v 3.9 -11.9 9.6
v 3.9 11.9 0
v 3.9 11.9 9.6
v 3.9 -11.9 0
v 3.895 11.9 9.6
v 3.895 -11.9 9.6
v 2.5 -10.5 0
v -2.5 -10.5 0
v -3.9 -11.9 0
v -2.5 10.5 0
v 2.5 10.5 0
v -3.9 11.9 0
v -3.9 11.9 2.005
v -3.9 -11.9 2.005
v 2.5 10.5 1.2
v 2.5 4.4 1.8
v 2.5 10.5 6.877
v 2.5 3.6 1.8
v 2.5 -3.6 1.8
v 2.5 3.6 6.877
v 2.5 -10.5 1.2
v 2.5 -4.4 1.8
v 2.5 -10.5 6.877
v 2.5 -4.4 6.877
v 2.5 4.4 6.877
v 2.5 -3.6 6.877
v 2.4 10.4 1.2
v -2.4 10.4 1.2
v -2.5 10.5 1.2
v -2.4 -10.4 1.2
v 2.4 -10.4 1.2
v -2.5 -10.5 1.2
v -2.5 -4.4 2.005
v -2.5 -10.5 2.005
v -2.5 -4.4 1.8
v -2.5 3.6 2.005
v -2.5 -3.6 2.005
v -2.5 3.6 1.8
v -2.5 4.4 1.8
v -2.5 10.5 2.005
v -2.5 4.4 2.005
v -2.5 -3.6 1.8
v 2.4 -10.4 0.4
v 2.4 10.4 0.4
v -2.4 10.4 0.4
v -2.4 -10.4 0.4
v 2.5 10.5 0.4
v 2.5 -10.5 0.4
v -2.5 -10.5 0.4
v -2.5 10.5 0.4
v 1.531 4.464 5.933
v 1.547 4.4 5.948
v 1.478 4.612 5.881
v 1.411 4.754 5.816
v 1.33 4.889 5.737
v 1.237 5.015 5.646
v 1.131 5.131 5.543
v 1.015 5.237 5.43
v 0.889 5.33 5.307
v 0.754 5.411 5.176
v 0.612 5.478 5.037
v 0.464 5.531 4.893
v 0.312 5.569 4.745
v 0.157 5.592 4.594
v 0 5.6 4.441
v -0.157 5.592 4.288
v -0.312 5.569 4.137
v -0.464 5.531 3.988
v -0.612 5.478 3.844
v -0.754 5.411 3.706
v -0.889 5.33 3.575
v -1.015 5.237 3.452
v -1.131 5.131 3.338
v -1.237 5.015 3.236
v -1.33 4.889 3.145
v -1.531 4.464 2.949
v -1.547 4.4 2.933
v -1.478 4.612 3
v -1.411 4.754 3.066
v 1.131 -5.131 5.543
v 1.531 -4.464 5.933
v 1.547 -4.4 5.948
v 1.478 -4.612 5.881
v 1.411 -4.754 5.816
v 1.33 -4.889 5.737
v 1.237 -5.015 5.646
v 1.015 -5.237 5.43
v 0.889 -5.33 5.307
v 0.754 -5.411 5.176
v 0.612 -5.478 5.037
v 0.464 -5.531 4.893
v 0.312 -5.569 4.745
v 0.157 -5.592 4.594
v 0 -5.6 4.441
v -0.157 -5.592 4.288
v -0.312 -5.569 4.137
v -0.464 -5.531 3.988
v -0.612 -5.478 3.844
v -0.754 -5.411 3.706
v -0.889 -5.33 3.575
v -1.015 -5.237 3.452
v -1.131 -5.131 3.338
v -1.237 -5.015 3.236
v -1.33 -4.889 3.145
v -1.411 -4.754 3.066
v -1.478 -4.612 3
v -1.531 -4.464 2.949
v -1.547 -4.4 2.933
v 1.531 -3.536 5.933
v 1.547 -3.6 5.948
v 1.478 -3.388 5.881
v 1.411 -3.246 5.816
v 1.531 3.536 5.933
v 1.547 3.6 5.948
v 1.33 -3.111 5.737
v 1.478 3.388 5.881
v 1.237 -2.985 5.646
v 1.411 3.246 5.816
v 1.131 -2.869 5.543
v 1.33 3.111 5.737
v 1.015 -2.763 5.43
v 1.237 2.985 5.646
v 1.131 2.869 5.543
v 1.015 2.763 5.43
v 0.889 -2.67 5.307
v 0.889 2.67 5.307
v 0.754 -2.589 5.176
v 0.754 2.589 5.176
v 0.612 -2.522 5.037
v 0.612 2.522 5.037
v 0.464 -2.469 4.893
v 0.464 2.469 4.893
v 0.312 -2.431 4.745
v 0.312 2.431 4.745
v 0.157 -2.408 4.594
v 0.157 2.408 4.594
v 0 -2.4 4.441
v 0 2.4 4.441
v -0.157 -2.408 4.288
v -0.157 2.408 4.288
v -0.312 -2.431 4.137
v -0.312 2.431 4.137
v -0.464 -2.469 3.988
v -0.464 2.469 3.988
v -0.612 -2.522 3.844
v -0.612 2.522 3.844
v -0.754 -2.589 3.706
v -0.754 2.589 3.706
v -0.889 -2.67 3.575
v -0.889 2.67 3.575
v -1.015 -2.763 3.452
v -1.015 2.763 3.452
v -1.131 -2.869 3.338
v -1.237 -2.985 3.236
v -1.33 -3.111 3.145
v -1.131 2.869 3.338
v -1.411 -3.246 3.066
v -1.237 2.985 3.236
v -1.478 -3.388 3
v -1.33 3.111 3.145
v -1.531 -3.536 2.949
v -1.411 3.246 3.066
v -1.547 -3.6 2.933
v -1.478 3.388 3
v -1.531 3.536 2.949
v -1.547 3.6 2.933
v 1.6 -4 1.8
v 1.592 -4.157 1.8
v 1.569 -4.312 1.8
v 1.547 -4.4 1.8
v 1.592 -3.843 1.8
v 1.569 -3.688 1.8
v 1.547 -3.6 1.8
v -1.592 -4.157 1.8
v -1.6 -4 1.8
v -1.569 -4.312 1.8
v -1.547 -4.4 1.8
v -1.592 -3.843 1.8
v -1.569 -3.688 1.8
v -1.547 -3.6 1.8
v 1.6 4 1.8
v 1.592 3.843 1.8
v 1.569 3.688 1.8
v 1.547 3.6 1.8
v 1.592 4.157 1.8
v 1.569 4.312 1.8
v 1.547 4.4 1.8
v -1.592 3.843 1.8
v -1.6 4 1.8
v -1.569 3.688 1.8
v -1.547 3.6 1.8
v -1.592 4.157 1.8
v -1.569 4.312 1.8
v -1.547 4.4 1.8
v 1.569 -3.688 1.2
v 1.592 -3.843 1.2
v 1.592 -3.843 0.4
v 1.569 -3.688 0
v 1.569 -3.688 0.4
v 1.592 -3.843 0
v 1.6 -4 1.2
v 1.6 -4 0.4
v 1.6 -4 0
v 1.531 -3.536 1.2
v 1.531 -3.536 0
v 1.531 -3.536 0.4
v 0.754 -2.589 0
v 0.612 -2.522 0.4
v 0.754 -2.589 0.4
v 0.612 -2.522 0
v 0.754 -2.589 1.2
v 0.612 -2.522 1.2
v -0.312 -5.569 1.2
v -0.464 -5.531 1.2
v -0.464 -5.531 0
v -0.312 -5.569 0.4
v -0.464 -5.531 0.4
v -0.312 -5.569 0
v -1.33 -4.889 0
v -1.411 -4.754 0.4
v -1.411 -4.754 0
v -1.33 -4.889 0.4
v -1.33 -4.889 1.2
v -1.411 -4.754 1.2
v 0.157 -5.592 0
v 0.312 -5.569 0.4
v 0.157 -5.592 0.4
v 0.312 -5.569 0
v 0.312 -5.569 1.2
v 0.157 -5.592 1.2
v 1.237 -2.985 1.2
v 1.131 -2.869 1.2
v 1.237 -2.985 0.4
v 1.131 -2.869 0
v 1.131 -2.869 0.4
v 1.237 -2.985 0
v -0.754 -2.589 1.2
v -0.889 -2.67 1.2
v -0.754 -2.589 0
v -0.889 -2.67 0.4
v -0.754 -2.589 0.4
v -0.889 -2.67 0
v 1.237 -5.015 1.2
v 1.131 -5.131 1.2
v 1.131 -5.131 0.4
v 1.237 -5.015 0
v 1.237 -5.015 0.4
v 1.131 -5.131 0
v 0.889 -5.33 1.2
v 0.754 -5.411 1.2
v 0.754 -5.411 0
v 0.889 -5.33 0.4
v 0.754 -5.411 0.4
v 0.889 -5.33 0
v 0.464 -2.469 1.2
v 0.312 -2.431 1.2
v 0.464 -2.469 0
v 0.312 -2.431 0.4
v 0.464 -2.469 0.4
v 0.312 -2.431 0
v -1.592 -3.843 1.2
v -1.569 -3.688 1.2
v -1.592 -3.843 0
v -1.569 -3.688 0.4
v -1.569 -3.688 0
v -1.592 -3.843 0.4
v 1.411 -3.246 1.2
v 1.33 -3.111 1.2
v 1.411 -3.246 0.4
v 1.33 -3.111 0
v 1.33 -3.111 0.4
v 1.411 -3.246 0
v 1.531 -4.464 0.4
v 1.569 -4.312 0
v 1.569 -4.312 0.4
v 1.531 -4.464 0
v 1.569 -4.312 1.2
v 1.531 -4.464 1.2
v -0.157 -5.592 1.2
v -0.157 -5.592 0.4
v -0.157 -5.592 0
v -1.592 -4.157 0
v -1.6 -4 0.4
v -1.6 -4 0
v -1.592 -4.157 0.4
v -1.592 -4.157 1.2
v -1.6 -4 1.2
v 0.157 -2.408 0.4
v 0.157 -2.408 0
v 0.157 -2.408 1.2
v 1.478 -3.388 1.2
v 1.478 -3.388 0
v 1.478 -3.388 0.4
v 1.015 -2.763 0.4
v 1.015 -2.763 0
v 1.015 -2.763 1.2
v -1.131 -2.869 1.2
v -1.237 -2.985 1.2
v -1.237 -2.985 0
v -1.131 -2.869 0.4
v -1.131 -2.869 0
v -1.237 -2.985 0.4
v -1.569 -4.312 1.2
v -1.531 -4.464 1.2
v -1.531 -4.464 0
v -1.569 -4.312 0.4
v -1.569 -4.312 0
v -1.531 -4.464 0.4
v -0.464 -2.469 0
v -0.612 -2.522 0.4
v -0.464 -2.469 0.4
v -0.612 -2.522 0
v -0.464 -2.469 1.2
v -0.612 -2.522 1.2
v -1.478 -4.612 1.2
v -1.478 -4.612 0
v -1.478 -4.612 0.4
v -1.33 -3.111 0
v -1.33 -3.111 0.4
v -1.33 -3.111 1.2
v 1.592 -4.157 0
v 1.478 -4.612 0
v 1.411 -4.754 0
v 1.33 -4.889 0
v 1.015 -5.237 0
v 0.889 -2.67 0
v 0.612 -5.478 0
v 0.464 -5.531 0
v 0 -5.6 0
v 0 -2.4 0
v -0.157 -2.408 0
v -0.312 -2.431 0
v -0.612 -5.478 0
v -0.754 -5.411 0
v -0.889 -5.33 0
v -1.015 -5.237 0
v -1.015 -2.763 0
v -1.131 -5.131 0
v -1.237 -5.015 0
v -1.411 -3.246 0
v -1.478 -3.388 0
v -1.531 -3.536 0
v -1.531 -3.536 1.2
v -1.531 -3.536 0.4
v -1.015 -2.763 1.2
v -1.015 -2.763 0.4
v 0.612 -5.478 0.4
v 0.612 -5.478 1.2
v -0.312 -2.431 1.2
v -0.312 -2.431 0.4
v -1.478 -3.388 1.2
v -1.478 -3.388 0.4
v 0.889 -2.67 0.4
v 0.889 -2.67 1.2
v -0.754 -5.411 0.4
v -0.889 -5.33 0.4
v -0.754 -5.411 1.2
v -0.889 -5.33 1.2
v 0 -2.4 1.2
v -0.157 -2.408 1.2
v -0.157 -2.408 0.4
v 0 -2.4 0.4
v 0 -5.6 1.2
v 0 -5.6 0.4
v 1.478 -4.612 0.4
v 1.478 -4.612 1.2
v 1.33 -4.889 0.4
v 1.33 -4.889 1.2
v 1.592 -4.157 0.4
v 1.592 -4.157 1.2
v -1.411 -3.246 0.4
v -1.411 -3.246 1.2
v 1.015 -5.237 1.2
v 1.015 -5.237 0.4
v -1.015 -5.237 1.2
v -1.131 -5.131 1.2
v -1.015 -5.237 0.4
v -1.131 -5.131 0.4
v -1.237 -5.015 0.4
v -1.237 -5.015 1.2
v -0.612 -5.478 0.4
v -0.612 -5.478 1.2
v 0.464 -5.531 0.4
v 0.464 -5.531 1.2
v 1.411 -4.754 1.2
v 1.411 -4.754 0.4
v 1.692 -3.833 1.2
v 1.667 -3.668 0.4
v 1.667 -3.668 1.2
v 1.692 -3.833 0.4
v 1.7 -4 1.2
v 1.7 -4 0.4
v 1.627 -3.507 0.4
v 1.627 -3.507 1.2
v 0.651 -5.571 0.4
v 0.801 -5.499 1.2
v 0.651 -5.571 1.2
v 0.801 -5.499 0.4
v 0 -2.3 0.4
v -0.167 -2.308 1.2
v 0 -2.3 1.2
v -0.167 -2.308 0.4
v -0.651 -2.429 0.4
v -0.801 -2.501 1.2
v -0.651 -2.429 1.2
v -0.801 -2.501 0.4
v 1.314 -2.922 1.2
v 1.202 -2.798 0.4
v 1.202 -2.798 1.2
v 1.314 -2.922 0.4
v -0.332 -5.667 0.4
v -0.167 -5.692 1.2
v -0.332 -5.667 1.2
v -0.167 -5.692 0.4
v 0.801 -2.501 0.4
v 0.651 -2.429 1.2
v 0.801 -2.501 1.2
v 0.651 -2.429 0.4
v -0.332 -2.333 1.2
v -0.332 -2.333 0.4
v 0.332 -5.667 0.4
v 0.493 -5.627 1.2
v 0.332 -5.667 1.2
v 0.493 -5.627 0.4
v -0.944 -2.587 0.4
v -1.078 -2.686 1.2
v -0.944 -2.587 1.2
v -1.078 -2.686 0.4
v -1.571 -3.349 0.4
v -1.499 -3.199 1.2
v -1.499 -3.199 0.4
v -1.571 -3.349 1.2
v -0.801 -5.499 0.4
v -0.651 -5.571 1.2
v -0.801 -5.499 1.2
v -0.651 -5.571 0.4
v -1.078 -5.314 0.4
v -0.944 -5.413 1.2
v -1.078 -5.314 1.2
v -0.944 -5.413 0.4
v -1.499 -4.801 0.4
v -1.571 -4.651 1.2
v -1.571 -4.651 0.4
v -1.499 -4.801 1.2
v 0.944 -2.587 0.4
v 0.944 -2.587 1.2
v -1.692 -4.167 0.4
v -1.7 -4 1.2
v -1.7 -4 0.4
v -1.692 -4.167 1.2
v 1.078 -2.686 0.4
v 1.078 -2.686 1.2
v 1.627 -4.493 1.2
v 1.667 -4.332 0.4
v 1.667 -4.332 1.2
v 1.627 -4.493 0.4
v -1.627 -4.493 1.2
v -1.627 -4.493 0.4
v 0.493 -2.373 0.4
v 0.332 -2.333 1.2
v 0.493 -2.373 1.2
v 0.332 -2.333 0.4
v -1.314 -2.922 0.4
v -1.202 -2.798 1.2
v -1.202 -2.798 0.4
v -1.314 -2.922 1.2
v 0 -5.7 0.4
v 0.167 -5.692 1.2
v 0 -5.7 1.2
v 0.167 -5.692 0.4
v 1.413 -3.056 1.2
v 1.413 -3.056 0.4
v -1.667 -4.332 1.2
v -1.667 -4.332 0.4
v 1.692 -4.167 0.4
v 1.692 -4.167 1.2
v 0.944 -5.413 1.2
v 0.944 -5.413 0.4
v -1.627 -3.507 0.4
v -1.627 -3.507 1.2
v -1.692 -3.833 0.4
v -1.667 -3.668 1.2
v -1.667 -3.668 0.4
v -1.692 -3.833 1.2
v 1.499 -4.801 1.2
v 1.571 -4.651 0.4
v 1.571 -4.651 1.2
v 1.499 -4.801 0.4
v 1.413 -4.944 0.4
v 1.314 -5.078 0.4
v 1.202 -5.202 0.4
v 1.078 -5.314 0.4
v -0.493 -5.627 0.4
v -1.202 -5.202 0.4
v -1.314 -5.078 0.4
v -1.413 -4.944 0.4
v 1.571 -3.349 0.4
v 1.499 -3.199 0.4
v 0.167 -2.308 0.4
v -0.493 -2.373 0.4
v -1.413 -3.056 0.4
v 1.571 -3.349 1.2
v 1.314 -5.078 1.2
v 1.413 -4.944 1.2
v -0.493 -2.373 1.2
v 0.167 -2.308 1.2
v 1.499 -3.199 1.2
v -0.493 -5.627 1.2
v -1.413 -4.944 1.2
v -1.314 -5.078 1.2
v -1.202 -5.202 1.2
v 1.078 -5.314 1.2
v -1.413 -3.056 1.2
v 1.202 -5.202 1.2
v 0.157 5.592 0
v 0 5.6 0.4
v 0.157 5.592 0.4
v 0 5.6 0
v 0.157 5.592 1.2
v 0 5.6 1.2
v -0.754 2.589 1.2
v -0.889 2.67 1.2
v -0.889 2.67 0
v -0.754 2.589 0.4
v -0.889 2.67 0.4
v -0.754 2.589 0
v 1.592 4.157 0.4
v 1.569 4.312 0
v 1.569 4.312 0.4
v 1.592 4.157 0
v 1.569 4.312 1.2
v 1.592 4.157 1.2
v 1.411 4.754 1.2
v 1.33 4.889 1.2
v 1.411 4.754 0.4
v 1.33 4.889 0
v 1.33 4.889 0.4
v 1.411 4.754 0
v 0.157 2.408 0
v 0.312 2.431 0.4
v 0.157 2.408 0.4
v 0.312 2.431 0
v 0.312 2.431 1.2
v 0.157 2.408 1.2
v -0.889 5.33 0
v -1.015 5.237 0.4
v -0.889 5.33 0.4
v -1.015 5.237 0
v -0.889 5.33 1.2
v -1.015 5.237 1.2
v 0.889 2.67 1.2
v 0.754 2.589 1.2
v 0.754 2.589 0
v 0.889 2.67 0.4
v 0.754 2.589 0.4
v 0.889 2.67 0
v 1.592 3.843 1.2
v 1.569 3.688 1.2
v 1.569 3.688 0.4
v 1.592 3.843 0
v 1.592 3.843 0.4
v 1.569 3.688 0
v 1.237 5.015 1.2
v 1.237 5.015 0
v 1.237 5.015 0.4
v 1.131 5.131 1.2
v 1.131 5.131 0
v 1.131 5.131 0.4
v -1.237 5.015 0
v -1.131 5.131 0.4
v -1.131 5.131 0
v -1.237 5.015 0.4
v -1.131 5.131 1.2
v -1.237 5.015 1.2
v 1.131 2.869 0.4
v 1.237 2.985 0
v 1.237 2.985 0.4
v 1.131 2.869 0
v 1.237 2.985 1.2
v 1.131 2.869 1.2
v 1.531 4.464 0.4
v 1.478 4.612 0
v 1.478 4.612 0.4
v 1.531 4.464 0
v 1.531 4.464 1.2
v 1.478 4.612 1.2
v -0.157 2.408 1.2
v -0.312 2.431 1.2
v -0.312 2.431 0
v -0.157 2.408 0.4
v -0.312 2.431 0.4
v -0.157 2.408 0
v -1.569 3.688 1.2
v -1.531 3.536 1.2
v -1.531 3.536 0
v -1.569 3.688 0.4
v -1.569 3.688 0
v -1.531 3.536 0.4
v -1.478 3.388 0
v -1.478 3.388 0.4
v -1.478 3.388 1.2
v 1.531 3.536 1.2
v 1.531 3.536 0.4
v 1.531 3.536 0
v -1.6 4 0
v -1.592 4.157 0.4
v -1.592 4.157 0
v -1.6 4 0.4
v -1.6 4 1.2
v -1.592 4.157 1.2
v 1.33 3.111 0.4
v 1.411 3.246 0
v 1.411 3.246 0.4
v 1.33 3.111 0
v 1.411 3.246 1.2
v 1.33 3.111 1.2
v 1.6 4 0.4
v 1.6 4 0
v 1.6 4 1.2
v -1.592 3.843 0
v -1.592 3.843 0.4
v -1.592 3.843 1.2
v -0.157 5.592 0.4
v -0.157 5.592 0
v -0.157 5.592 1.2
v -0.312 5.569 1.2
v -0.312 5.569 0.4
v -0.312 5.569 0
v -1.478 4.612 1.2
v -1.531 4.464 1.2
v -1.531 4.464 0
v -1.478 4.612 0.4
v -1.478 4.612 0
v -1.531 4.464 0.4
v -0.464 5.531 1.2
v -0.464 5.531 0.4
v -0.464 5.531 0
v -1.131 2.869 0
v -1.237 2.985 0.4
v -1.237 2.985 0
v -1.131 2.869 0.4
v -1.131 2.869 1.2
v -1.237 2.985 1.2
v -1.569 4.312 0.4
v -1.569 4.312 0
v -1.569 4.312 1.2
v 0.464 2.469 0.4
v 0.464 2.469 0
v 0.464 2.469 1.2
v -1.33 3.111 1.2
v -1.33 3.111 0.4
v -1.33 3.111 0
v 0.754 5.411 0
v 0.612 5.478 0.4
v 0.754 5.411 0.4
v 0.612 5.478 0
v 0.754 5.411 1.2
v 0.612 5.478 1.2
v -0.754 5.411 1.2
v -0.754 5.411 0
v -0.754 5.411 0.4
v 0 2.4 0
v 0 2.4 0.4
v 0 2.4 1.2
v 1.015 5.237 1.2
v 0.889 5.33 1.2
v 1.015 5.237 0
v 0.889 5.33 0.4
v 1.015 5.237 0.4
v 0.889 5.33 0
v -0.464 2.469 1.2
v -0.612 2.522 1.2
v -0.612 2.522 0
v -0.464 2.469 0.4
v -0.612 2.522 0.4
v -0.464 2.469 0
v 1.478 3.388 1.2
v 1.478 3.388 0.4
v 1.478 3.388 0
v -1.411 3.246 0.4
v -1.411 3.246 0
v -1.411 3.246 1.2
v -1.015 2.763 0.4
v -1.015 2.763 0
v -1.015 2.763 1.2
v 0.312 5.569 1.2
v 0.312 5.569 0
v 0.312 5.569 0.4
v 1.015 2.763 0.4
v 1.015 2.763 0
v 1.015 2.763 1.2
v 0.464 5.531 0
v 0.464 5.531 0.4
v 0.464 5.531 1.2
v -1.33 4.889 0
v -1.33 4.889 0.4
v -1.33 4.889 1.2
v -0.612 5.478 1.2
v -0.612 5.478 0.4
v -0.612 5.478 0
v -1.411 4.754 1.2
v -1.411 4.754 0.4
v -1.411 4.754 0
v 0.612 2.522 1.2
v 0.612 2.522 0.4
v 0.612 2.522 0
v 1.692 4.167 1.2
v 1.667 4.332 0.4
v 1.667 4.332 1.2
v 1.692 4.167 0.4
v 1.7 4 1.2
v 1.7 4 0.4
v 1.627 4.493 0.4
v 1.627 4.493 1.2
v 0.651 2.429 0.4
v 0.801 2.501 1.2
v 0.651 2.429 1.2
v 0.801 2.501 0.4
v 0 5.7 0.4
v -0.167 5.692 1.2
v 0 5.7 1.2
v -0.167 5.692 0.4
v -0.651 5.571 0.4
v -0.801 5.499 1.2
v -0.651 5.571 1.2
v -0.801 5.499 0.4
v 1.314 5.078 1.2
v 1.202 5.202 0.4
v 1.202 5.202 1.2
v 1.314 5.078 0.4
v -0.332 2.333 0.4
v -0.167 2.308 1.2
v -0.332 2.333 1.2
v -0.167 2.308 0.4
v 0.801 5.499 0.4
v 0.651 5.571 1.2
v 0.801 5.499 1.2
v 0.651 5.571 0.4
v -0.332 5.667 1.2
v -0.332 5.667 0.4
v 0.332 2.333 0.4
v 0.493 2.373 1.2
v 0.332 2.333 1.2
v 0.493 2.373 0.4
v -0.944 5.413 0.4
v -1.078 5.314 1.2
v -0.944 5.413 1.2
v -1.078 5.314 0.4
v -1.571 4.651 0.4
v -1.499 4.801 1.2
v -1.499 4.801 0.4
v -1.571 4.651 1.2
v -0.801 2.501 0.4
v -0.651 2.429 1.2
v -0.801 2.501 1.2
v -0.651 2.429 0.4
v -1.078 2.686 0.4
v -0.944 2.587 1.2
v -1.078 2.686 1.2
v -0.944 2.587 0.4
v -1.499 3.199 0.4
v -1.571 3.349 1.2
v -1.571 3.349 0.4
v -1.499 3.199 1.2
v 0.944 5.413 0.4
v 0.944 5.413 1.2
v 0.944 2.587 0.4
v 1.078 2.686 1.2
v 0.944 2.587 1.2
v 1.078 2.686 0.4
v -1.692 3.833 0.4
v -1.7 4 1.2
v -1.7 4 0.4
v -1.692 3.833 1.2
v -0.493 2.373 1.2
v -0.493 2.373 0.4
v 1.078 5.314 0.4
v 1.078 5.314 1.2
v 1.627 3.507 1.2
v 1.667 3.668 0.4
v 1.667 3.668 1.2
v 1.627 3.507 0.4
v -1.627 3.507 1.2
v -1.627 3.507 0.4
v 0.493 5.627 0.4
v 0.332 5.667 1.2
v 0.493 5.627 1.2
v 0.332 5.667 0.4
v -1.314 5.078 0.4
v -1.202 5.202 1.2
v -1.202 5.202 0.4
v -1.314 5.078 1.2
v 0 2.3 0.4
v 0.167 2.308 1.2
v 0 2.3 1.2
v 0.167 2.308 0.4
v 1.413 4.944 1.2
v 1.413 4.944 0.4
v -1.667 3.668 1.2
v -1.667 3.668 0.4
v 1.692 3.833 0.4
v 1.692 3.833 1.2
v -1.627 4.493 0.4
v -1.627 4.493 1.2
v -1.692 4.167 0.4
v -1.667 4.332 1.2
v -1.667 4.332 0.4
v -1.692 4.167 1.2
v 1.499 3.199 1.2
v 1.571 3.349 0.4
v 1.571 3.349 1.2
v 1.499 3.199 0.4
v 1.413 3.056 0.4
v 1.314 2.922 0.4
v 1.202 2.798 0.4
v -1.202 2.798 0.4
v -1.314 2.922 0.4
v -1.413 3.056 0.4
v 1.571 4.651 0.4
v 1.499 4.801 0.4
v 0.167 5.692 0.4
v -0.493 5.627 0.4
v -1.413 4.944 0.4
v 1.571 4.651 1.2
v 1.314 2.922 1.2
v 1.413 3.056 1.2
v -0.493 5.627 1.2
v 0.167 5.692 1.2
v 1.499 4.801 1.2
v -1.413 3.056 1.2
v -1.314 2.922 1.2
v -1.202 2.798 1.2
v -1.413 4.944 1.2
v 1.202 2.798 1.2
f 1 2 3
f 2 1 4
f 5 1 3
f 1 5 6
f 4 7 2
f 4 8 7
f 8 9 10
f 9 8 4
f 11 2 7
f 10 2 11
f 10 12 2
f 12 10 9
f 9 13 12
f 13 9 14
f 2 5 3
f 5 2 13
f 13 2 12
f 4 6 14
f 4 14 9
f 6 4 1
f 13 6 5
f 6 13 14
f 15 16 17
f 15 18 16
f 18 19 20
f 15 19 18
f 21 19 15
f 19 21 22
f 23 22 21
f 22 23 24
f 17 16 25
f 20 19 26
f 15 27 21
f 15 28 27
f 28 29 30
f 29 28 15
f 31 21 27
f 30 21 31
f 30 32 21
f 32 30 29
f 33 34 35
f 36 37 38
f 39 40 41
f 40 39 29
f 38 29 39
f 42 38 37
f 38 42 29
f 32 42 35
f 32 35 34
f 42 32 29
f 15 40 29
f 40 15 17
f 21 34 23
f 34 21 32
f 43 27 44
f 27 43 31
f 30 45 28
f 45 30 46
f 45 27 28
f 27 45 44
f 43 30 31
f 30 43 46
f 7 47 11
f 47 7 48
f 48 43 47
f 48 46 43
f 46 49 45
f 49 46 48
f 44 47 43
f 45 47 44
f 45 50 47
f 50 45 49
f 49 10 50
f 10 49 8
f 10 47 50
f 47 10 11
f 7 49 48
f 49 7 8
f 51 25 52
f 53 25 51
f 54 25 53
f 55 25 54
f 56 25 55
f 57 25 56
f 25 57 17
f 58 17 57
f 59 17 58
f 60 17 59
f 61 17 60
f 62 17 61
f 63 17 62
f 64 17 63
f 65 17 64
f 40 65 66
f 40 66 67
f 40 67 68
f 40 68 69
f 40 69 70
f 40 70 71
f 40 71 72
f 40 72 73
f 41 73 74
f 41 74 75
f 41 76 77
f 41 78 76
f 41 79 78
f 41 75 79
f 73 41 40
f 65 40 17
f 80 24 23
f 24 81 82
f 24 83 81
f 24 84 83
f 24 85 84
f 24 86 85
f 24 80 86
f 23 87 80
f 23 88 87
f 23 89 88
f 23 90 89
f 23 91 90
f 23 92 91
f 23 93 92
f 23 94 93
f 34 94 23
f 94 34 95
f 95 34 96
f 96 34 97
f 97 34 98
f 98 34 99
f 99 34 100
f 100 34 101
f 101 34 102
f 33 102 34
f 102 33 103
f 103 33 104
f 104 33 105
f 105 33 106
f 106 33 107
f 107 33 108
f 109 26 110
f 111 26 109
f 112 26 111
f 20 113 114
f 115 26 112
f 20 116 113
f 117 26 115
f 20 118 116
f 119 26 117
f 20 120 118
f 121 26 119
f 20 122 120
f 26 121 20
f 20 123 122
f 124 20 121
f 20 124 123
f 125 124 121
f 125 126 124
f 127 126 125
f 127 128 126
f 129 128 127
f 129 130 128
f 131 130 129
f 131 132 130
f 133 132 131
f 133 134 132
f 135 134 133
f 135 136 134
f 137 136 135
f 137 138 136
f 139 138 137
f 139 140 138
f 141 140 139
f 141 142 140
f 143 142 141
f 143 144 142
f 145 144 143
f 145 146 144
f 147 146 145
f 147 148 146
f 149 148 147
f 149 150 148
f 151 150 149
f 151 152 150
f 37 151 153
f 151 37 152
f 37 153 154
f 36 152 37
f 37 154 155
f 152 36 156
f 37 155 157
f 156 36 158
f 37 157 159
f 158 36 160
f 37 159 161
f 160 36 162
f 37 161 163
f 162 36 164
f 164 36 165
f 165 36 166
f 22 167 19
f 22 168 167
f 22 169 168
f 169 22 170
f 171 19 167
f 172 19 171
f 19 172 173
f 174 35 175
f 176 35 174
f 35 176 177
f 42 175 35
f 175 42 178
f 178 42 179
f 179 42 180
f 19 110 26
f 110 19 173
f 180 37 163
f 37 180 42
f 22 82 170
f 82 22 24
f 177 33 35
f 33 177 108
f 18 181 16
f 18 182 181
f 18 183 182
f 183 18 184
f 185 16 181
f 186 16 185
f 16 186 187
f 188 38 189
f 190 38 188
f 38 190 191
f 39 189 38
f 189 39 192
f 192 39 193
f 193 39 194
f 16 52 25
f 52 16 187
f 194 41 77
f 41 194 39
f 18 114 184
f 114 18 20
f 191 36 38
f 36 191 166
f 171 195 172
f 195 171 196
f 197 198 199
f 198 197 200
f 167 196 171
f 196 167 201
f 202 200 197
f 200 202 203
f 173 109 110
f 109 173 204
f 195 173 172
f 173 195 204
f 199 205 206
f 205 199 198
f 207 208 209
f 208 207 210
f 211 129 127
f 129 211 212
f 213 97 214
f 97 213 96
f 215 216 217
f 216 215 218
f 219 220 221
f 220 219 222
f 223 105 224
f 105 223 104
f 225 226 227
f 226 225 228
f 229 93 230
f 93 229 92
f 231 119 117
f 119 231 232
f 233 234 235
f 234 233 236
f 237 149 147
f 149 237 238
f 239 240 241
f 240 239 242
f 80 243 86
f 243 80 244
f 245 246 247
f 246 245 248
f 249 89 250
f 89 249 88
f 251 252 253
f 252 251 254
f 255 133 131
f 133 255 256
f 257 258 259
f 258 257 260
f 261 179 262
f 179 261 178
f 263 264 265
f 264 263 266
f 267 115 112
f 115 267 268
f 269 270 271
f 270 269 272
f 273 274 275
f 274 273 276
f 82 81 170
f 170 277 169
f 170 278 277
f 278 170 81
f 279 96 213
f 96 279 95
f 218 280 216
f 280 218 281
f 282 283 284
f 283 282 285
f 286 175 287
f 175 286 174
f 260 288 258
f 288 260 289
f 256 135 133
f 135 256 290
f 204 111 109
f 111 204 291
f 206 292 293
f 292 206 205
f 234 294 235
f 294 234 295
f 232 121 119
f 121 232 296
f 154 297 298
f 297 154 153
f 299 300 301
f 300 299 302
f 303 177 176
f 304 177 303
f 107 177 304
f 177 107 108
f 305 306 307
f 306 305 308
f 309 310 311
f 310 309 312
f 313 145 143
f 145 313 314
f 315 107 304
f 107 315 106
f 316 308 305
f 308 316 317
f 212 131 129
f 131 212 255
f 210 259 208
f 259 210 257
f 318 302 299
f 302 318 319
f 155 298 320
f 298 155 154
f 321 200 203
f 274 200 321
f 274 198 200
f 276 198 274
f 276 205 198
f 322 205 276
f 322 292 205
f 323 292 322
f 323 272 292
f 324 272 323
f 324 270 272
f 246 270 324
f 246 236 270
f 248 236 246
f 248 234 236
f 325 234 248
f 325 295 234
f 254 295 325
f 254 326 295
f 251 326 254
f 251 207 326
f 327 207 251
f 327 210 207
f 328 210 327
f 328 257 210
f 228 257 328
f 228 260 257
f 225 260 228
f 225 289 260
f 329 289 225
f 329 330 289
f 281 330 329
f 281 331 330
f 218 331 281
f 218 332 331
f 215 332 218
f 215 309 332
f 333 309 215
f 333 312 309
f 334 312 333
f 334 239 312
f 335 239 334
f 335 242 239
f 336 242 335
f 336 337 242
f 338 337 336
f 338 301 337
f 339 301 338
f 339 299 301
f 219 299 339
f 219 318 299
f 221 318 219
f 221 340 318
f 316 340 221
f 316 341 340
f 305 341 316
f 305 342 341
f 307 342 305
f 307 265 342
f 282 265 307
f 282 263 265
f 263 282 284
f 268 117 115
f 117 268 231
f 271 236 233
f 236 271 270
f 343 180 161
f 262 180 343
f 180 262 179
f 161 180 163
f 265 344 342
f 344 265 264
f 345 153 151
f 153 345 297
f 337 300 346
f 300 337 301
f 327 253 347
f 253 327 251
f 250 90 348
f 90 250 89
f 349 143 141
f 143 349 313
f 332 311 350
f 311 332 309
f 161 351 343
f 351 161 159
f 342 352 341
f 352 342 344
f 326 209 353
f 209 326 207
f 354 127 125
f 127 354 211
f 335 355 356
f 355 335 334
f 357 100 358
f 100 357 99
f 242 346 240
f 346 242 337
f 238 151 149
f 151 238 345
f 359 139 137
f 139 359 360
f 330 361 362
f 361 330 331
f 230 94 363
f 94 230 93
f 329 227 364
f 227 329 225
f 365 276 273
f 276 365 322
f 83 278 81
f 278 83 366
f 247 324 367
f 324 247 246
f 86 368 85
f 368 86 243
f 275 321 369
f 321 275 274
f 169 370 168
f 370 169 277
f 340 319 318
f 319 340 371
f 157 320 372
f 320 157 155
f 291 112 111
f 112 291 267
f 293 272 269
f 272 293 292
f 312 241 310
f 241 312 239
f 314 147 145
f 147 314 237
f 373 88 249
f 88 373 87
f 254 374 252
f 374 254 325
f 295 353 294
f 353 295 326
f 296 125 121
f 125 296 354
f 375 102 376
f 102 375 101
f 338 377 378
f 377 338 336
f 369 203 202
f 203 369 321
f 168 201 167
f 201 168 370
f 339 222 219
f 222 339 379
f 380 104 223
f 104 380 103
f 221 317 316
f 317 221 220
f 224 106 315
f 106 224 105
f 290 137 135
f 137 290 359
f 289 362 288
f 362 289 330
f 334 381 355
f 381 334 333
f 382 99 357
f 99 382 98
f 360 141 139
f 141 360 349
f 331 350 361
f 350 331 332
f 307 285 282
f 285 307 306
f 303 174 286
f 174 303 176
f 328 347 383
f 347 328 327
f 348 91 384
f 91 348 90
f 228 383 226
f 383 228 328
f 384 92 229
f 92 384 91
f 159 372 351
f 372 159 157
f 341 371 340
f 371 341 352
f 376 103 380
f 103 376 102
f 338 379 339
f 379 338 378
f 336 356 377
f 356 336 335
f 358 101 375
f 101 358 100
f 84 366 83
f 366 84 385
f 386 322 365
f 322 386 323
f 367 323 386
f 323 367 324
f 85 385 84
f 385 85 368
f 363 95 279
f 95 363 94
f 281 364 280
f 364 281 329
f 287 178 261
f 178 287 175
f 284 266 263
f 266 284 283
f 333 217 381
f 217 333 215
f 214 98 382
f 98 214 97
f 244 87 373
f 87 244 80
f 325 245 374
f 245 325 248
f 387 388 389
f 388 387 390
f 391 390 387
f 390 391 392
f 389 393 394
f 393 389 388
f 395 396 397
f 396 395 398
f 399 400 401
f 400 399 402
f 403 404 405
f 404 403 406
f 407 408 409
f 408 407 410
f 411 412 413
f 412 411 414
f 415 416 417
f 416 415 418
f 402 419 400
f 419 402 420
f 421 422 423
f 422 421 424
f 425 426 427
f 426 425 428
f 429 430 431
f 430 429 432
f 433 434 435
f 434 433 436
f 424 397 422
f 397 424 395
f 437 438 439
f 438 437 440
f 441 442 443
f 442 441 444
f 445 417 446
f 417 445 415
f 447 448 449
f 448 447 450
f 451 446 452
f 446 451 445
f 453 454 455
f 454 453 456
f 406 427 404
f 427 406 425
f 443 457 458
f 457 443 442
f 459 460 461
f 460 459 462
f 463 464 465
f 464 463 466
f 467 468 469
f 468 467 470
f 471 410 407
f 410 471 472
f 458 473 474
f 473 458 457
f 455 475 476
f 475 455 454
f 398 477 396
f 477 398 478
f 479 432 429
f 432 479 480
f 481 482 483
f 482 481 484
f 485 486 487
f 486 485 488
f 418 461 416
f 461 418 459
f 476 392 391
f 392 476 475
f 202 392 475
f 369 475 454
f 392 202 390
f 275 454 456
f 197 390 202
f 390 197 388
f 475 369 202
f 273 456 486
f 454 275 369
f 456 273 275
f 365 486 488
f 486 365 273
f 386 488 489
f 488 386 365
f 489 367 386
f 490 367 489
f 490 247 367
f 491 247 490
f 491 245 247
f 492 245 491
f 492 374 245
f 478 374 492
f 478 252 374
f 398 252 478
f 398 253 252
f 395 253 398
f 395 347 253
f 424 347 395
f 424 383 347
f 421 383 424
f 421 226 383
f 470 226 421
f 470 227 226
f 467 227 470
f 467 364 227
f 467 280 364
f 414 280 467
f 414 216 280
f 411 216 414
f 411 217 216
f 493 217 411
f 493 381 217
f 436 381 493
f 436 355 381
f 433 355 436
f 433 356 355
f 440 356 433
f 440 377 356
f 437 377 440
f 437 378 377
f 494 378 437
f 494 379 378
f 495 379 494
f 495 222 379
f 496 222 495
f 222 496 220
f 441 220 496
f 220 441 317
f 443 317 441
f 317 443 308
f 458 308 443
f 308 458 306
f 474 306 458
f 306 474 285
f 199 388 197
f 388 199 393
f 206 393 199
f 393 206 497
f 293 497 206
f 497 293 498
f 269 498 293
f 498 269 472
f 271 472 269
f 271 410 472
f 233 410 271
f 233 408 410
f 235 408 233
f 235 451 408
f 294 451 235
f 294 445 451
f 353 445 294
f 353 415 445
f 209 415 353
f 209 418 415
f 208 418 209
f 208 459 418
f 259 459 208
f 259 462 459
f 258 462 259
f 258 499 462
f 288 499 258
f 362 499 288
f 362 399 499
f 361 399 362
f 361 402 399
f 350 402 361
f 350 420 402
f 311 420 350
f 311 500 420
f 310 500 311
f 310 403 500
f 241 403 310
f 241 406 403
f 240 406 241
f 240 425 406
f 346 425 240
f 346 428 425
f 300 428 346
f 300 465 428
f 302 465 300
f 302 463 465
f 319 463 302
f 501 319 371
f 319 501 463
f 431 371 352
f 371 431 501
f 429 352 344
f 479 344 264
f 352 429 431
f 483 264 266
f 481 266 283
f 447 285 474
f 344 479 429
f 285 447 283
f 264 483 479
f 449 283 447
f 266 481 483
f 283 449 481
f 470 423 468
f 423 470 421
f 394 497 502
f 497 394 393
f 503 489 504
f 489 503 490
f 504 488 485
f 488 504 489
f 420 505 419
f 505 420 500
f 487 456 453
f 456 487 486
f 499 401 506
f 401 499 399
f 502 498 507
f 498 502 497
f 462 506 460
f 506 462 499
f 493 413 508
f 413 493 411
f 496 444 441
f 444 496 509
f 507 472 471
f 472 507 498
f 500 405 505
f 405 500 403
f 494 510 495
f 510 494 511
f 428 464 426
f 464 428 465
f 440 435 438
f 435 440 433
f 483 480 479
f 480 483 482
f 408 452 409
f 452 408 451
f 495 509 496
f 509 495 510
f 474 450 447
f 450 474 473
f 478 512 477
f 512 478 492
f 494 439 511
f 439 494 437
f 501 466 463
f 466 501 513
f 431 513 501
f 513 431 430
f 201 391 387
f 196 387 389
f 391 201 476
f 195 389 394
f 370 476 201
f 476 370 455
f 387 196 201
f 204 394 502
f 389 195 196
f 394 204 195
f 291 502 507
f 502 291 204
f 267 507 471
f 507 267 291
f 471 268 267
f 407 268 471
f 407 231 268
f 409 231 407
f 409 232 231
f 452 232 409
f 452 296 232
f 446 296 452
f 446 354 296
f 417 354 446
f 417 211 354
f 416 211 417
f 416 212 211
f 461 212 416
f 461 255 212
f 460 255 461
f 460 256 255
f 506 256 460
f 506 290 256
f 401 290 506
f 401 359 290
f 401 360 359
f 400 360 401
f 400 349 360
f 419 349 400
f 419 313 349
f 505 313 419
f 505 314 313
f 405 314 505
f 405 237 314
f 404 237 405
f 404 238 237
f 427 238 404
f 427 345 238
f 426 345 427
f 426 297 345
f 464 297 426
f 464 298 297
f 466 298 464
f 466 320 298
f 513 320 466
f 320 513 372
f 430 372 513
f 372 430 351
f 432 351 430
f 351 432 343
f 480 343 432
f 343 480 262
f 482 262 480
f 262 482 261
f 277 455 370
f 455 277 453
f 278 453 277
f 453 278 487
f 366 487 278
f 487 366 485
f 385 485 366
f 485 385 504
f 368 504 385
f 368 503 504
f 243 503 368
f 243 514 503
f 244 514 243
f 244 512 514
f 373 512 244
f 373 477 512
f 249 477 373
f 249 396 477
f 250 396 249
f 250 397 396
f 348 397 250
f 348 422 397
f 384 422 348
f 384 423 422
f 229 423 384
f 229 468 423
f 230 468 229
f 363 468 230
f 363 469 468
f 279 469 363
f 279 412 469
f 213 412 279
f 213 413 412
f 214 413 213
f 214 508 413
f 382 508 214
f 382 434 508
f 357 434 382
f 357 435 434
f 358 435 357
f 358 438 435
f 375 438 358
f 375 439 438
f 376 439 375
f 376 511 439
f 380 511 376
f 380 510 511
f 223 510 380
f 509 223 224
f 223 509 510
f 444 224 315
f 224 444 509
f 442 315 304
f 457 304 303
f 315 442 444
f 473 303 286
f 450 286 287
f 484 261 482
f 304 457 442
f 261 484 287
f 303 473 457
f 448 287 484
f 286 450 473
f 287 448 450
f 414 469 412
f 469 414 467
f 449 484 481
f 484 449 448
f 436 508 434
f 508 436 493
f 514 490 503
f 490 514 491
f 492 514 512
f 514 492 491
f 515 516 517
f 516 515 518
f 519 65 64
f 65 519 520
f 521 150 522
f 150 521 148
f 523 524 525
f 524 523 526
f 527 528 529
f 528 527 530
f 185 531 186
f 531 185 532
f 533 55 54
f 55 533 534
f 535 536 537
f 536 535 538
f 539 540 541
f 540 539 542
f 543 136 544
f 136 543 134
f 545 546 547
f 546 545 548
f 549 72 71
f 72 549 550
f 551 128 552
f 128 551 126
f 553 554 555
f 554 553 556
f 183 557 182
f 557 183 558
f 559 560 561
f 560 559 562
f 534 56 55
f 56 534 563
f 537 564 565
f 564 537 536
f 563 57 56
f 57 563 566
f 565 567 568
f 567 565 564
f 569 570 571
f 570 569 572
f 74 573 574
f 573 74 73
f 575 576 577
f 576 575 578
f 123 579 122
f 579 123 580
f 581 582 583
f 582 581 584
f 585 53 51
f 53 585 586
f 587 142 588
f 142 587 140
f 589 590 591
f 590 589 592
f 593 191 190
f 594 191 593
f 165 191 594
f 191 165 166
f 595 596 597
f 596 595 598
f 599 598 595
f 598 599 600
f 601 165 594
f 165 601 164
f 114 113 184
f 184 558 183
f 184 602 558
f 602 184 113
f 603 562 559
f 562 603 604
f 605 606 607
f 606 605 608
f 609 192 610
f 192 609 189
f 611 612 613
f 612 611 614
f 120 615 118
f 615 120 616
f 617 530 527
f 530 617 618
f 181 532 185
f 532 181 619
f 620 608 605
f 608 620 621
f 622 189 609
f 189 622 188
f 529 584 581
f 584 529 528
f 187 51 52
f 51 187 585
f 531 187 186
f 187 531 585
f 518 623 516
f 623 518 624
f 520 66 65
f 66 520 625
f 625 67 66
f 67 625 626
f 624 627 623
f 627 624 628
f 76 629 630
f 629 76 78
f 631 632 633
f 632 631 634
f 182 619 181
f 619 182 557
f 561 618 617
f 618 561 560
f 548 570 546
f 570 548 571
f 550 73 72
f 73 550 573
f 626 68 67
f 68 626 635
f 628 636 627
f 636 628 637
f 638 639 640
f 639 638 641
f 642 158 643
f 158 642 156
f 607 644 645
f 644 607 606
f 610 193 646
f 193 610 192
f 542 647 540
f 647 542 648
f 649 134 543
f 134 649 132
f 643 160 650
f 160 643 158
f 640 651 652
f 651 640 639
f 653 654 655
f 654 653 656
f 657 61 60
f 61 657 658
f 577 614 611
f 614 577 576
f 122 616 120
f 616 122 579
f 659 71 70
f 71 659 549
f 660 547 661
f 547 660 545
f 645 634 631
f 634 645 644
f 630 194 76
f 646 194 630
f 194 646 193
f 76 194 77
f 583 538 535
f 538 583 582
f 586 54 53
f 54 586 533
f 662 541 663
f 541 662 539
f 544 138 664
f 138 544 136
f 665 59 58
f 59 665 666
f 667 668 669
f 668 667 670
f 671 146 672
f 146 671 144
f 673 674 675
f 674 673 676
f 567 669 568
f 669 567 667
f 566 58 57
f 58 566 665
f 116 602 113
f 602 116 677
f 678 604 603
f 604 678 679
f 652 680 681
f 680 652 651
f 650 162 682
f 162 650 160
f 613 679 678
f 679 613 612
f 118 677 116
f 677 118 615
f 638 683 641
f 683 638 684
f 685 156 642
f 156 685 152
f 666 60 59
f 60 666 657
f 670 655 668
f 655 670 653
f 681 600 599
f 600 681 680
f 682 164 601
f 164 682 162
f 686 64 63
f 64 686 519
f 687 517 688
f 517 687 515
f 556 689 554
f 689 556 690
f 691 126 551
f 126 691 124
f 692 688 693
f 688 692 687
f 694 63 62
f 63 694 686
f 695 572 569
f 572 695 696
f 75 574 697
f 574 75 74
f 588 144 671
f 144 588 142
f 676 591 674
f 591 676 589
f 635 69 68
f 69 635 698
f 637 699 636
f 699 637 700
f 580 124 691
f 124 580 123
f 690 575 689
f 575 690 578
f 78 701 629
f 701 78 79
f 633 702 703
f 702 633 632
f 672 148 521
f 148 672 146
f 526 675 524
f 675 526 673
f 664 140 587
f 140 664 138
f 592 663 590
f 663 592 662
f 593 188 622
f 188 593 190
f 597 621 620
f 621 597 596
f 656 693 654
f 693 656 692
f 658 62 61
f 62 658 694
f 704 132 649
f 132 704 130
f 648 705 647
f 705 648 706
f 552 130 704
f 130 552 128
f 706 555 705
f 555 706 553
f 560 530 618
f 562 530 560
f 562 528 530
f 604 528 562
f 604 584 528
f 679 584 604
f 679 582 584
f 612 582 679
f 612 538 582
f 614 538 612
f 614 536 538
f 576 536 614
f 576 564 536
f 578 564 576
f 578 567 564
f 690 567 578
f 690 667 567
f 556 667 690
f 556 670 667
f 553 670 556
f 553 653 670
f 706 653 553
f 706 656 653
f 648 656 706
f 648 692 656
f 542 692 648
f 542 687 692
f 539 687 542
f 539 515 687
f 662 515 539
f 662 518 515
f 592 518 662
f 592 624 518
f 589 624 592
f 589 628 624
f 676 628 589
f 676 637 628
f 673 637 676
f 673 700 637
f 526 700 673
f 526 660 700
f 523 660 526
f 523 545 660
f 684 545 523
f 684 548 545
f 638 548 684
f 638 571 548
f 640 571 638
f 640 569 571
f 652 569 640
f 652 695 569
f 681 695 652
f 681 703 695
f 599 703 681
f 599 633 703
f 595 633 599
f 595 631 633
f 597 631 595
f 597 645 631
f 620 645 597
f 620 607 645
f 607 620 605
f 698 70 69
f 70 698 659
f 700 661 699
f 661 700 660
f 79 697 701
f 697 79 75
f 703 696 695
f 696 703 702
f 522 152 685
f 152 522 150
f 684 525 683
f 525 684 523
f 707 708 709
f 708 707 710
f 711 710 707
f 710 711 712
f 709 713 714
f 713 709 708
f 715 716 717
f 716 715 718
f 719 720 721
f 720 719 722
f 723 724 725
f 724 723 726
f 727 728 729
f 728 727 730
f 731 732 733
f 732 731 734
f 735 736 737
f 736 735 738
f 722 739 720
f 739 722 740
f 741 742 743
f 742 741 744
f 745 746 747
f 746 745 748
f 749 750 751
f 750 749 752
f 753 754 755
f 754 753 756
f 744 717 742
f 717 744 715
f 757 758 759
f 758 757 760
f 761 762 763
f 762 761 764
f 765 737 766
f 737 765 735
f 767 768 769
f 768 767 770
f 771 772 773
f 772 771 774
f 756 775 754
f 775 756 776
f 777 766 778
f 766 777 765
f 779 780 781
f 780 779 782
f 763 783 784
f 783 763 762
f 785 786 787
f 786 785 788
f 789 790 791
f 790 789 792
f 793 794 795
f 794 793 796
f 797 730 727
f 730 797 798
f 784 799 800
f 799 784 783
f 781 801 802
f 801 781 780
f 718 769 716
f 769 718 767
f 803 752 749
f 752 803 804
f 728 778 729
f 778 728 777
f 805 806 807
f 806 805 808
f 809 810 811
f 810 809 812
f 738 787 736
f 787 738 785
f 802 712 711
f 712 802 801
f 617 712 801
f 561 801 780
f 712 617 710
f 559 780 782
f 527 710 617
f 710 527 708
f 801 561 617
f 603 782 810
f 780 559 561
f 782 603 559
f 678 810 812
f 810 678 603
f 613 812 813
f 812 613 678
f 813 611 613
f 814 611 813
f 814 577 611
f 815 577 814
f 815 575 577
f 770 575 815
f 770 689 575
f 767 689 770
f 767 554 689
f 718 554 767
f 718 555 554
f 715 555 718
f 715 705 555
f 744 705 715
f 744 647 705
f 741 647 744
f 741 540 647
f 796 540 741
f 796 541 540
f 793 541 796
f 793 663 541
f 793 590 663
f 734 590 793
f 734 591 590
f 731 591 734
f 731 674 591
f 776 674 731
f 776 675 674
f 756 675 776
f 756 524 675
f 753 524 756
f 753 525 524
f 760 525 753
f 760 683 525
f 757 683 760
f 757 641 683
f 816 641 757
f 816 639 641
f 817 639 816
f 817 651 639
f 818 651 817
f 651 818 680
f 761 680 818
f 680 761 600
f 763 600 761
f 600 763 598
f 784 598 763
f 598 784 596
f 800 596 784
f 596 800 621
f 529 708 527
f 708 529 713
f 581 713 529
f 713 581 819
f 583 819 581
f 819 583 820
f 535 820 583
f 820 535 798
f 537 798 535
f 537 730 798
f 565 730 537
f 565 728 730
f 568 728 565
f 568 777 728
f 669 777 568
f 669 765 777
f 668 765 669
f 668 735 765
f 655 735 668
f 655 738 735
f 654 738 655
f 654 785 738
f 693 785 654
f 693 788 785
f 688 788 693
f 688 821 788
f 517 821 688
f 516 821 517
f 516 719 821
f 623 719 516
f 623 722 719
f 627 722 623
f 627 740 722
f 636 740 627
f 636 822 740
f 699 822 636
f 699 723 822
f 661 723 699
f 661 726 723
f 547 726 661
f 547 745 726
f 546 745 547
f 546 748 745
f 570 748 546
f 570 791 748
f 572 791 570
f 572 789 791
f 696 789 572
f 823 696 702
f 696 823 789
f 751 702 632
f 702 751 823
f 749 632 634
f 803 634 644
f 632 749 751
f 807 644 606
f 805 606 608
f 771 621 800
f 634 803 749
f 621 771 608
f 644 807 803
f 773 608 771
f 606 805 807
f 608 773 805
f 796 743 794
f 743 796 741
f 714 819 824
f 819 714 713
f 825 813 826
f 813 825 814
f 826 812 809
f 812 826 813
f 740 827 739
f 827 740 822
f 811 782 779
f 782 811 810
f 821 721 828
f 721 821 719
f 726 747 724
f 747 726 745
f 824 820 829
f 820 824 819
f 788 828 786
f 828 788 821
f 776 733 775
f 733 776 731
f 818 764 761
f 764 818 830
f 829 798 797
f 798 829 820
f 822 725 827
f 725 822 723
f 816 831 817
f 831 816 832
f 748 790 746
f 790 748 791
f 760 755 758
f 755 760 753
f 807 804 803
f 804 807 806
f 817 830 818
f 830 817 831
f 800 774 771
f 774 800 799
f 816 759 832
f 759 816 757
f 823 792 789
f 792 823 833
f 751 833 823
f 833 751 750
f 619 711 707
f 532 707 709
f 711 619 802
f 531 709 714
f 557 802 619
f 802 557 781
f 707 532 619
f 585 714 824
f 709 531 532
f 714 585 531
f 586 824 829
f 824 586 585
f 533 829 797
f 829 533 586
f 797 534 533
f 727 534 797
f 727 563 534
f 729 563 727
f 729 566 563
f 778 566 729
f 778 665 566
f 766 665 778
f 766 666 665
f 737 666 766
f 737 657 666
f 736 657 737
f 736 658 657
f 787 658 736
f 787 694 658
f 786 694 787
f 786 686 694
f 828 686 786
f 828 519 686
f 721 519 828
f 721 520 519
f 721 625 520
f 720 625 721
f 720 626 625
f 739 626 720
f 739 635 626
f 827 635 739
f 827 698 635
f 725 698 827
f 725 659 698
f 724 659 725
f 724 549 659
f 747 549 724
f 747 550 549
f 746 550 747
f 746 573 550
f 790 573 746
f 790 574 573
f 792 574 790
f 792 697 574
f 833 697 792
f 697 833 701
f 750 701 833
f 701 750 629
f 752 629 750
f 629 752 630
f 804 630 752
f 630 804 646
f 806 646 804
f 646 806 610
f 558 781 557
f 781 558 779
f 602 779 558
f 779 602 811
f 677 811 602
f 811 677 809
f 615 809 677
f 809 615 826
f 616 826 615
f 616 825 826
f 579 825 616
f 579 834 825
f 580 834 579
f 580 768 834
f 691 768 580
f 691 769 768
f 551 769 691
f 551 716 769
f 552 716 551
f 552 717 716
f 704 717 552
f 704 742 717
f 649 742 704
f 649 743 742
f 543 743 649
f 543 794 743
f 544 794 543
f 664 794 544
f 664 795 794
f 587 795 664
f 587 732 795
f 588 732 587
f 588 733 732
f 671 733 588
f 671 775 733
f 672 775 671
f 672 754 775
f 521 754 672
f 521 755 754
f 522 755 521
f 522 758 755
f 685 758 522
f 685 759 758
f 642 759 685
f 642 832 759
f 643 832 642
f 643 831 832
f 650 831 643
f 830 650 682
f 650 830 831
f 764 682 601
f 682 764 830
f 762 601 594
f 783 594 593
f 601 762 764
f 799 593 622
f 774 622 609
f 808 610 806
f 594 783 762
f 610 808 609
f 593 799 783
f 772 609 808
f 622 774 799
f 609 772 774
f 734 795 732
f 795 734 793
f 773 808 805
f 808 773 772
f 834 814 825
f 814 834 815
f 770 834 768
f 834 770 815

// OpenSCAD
// file: ../../lib/connectors.scad
module
mb_connector_prism(side, height, size)
{
  zRots = [ 315, 135, 45, 225 ];
  rotate([ 90, 90, zRots[side] ])
    translate([ -0.5 * height, -0.5 * size, -0.5 * size ])
      polyhedron(points =
                   [
                     [ 0, 0, 0 ],
                     [ height, 0, 0 ],
                     [ height, size, 0 ],
                     [ 0, size, 0 ],
                     [ 0, size, size ],
                     [ height, size, size ]
                   ],
                 faces = [
                   [ 0, 1, 2, 3 ],
                   [ 5, 4, 3, 2 ],
                   [ 0, 4, 5, 1 ],
                   [ 0, 3, 4 ],
                   [ 5, 2, 1 ]
                 ]);
}

module
mb_connectors(side, grid, baseHeight, height, size, depth, gs, inverse)
{
  sigs = [ -1, 1, -1, 1 ];
  gX = [ 0, 0, 1, 1 ];
  gY = [ 1, 1, 0, 0 ];

rotate(inverse ? [0,0,180]:[0,0,0])
  for (i = [0:1:grid[gY[side]] - 1]) {
    t0X = (0.5 * grid[gX[side]] * gs + (inverse ? -1 : 1) * depth);
    t0Y = (i + 0.5 - 0.5 * grid[gY[side]]) * gs;

    color([ 0.945, 0.769, 0.059 ]) // f1c40f
      translate([

        side < 2 ? (inverse ? -1 : 1) * sigs[side] * t0X : t0Y,
        side < 2 ? t0Y : (inverse ? -1 : 1) * sigs[side] * t0X,
        -0.5 * baseHeight + 0.5 *
        (height + (inverse ? -0.02 : 0))
      ]) mb_connector_prism(side, height+ (inverse ? 0.02 : 0), size);
  }
}

module
mb_connector_grooves(side,
                     grid,
                     baseHeight,
                     height,
                     tolerance,
                     size,
                     depth,
                     gs,
                     inverse)
{
  gX = [ 0, 0, 1, 1 ];
  gY = [ 1, 1, 0, 0 ];
  rot = [ 90, 90, 0, 0 ];
  
  sigs = [ 1, -1, -1, 1 ];
  rotate([ 90, inverse ? 180 : 0, rot[side] ]) for (i =
                                                      [0:1:grid[gY[side]] - 1])
  {
    translate([
      (-(0.5 * grid[gY[side]] - 0.5) * gs + i * gs),
      -0.5 * baseHeight + height,
      sigs[side] * (-0.5 * grid[gX[side]] * gs + 0.5 * depth - 0.02)
    ]) mb_connector_prism(3, depth + 0.02, size);
  }
}
// file: ../../lib/pcb.scad
module prism(l, w, h) {
    translate([-0.5*l,0, -0.5*h])
    rotate([0,0,-90])
       polyhedron(points=[
               [0,0,h],           // 0    front top corner
               [0,0,0],[w,0,0],   // 1, 2 front left & right bottom corners
               [0,l,h],           // 3    back top corner
               [0,l,0],[w,l,0]    // 4, 5 back left & right bottom corners
       ], faces=[ // points for all faces must be ordered clockwise when looking in
               [0,2,1],    // top face
               [3,4,5],    // base face
               [0,1,4,3],  // h face
               [1,2,5,4],  // w face
               [0,3,5,2],  // hypotenuse face
       ]);
}

/*
module holder(holderLength, holderHeight, holderThickness, holderPrismWidth, holderPrismHeight, holderPlateHeight){
    translate([0,0, 0])
        cube([holderLength, holderThickness, holderHeight], center=true);
    
    translate([0, -0.5*(holderPrismWidth-holderThickness), 0.5*(holderHeight + holderPlateHeight)])
        cube([holderLength, holderPrismWidth, holderPlateHeight], center=true);

    translate([0, 0.5*holderThickness, 0.5*(holderHeight + holderPrismHeight) + holderPlateHeight]){
        prism(holderLength, holderPrismWidth, holderPrismHeight);
    }   
    
}
*/

module holder(holderLength, holderHeight, holderThickness, holderPrismWidth, holderPrismHeight, holderPlateHeight){
    translate([0,0, 0])
        cube([holderLength, holderThickness, holderHeight], center=true);
    
    translate([0, -0.5*(holderPrismWidth-holderThickness), 0.5*(holderHeight + holderPlateHeight)])
        cube([holderLength, holderPrismWidth, holderPlateHeight], center=true);
    
    translate([0,0.5*holderThickness, 0.5*(holderHeight)]){
        translate([0,0, holderPlateHeight + 0.5* + holderPrismHeight])
        prism(holderLength, holderPrismWidth, holderPrismHeight);
        
        
        translate([0, -holderThickness , -0.125*holderPrismHeight])
            rotate([0,180,0])
                prism(holderLength, holderPrismWidth-holderThickness, 0.25*holderPrismHeight);
    }   
    
}

module pcb(
    pcbDimensions = [30, 20, 3],
    holderThickness = 1.2,
    
    holderLength = 8,
    holderPlateHeight = 0.2,
    platerSize = 3,
    platerHeight = 2
){    
    holderPrismHeight = 1;
    holderPrismWidth = 0.5 * holderPrismHeight + holderThickness;
    holderHeight = pcbDimensions[2] + platerHeight;

    
        translate([0, 0.5 * (pcbDimensions[1] + holderThickness), 0.5*holderHeight]){
            holder(holderLength, holderHeight, holderThickness, holderPrismWidth, holderPrismHeight, holderPlateHeight);
        }   
        
        translate([0, -0.5 * (pcbDimensions[1] + holderThickness), 0.5*holderHeight]){
            rotate([0, 0, 180])
                holder(holderLength, holderHeight, holderThickness, holderPrismWidth, holderPrismHeight, holderPlateHeight);
        }
        
        translate([0.5*(pcbDimensions[0] + holderThickness), 0, 0.5*holderHeight]){
            rotate([0, 0, -90])
                holder(holderLength, holderHeight, holderThickness, holderPrismWidth, holderPrismHeight, holderPlateHeight);
        }
        
        translate([-0.5*(pcbDimensions[0] + holderThickness), 0, 0.5*holderHeight]){
            rotate([0, 0, 90]){
                holder(holderLength, holderHeight, holderThickness, holderPrismWidth, holderPrismHeight, holderPlateHeight);
            }
        }
        
        translate([-0.5 * (pcbDimensions[0] - platerSize) - holderThickness, 0.5 * (platerSize - pcbDimensions[1]) - holderThickness, 0.5*platerHeight]){
            cube([platerSize, platerSize, platerHeight], center=true);
        }
        
        translate([0.5 * (pcbDimensions[0] - platerSize) + holderThickness, 0.5 * (platerSize - pcbDimensions[1]) - holderThickness, 0.5*platerHeight]){
            cube([platerSize, platerSize, platerHeight], center=true);
        }
        
        translate([-0.5 * (pcbDimensions[0] - platerSize) - holderThickness, -0.5 * (platerSize - pcbDimensions[1]) + holderThickness, 0.5*platerHeight]){
            cube([platerSize, platerSize, platerHeight], center=true);
        }
        
        translate([0.5 * (pcbDimensions[0] - platerSize) + holderThickness, -0.5 * (platerSize - pcbDimensions[1]) + holderThickness, 0.5*platerHeight]){
            cube([platerSize, platerSize, platerHeight], center=true);
        }
    
}
// file: ../../lib/svg3d.scad
module svg3d(file, orgWidth, orgHeight, depth, size, center = true){
    translate([0, 0, -0.5*depth])
    //scale([size, size, 1])
        //surface(file = file, center = true, invert = true);
        
        
        linear_extrude(depth) {
            scale([size, size, 0])
            translate([-0.5*orgWidth, -0.5*orgHeight, 0])
                import(file);
        }
        
    
}
// file: ../../lib/text3d.scad
module text3d(text, textDepth, textSize, textFont, textSpacing, center = true){
    translate([0,0,-0.5*textDepth])
        linear_extrude(textDepth) {
            text(text, size = textSize, font = textFont, spacing = textSpacing, halign = "center", valign = "center", $fn = 64);
        }
}
// file: ../../lib/shapes.scad
module mb_roundedcube(size = [1, 1, 1], center = false, radius = 0.5, apply_to = "all", resolution = 20) {
	// If single value, convert to [x, y, z] vector
	size = (size[0] == undef) ? [size, size, size] : size;

	translate_min = radius;
	translate_xmax = size[0] - radius;
	translate_ymax = size[1] - radius;
	translate_zmax = size[2] - radius;

	diameter = radius * 2;

	obj_translate = (center == false) ?
		[0, 0, 0] : [
			-(size[0] / 2),
			-(size[1] / 2),
			-(size[2] / 2)
		];

	translate(v = obj_translate) {
		hull() {
			for (translate_x = [translate_min, translate_xmax]) {
				x_at = (translate_x == translate_min) ? "min" : "max";
				for (translate_y = [translate_min, translate_ymax]) {
					y_at = (translate_y == translate_min) ? "min" : "max";
					for (translate_z = [translate_min, translate_zmax]) {
						z_at = (translate_z == translate_min) ? "min" : "max";

						translate(v = [translate_x, translate_y, translate_z])
						if (
							(apply_to == "all") ||
							(apply_to == "xmin" && x_at == "min") || (apply_to == "xmax" && x_at == "max") ||
							(apply_to == "ymin" && y_at == "min") || (apply_to == "ymax" && y_at == "max") ||
							(apply_to == "zmin" && z_at == "min") || (apply_to == "zmax" && z_at == "max")
						) {
							sphere(r = radius, $fn = resolution);
						} else {
							rotate = 
								(apply_to == "xmin" || apply_to == "xmax" || apply_to == "x") ? [0, 90, 0] : (
								(apply_to == "ymin" || apply_to == "ymax" || apply_to == "y") ? [90, 90, 0] :
								[0, 0, 0]
							);
							rotate(a = rotate)
							cylinder(h = diameter, r = radius, center = true, $fn = resolution);
						}
					}
				}
			}
		}
	}
}

module mb_roundedcube_simple(size = [1, 1, 1], center = false, radius = 0.5, resolution = 20) {
	// If single value, convert to [x, y, z] vector
	size = (size[0] == undef) ? [size, size, size] : size;

	translate = (center == false) ?
		[radius, radius, radius] :
		[
			radius - (size[0] / 2),
			radius - (size[1] / 2),
			radius - (size[2] / 2)
	];

	translate(v = translate)
	minkowski() {
		cube(size = [
			size[0] - (radius * 2),
			size[1] - (radius * 2),
			size[2] - (radius * 2)
		]);
		sphere(r = radius, $fn = resolution);
	}
}

module mb_roundedcube_custom(size = [1, 1, 1], center = false, radius = 0.1, resolution = 20) {
	size = (size[0] == undef) ? [size, size, size] : size;

	obj_translate = (center == false) ?
		[0, 0, 0] : [
			-(size[0] / 2),
			-(size[1] / 2),
			-(size[2] / 2)
		];


	translate(v = obj_translate) {
		if(radius == 0 || radius == [0,0,0,0]){
			cube(size=size);
		}
		else{
			rots=[180,90,0,-90];
			radius = (radius[0] == undef) ? [radius, radius, radius, radius] : radius;
			hull() {
			//union(){
				for (i = [ 0 : 1 : 3 ]){
					cornerRadius = radius[i] == 0 ? 0.1 : radius[i];
					translateX = i < 2 ? cornerRadius : size[0] - cornerRadius;
					translateY = (i == 0) || (i == 3) ? cornerRadius : size[1] - cornerRadius;
				
					//translate_min = cornerRadius;
					//translate_zmax = size[2] - cornerRadius;						

					//for (translate_z = [translate_min, translate_zmax]) {
					translate(v = [translateX, translateY, 0.5 * size[2]]){
							if(radius[i] == 0)
							cube(size = [2*cornerRadius, 2*cornerRadius, size[2]], center = true);
							else
							rotate([0,0,rots[i]])
								translate([0,0,-0.5*size[2]])
									rotate_extrude(angle=90) 
										square([cornerRadius, size[2]]);
							//cylinder(h = size[2], r = cornerRadius, center = true, $fn = resolution);
					}
					//}
				}
			}
		}
	}
}

module mb_rounded_block(size, resolution, center=true, radius = 0){
	if((radius == 0) || (radius == [0, 0, 0]) || (radius == [[0,0,0,0], [0,0,0,0], [0,0,0,0]])){
		cube(size = size, center = center);
	}
	else if((radius[0] == 0 || radius[0] == [0,0,0,0]) && (radius[1] == 0 || radius[1] == [0,0,0,0]) && (radius[2] != 0 && radius[2] != [0,0,0,0])){
		mb_roundedcube_custom(
			size = size, 
			center = center, 
			radius = radius[2], 
			resolution = resolution
		);
	}
	else{
		radius = (radius[0] == undef) ? [radius, radius, radius] : radius;
		size = (size[0] == undef) ? [size, size, size] : size;
		intersection() {
			
			//X-Axis
			rotate([0,90,0])     
				mb_roundedcube_custom(
					size = [size[2], size[1], size[0]], 
					center = center, 
					radius = radius[0], 
					resolution = resolution
				);
			
			//Y-Axis
			rotate([90,0,0]) 
				mb_roundedcube_custom(
					size = [size[0], size[2], size[1]], 
					center = center, 
					radius = radius[1], 
					resolution = resolution
				);
			
			//Z-Axis
			mb_roundedcube_custom(
				size = size, 
				center = center, 
				radius = radius[2], 
				resolution = resolution
			);
		}
	}
}

module mb_torus(circleRadius, torusRadius, circleResolution = 30, torusResolution = 30){
    rotate_extrude(convexity = 10, $fn = torusResolution)
        translate([torusRadius - circleRadius, 0, 0])
            circle(r = circleRadius, $fn = circleResolution);
}
// main file
/**
* MachineBlocks
* https://machineblocks.com/examples/slanted
*
* Slanted Brick S1 1x3
* Copyright (c) 2022 - 2025 Jan Philipp Knoeller <pk@pksoftware.de>
*
* Published under license:
* Creative Commons Attribution-NonCommercial-ShareAlike 4.0 International 
* https://creativecommons.org/licenses/by-nc-sa/4.0/
*
*/

// Include the library
use <../../lib/block.scad>;

/* [Size] */

// Brick size in X-direction specified as multiple of an 1x1 brick.
brickSizeX = 1; // [1:32]  
// Brick size in Y-direction specified as multiple of an 1x1 brick.
brickSizeY = 3; // [1:32]  
// Height of brick specified as number of layers. Each layer has the height of one plate.
baseLayers = 3; // [1:24]

/* [Appearance] */

// Type of cut-out on the underside.
baseCutoutType = "classic"; // [none, classic]
// Whether to draw knobs.
knobs = true;
// Whether knobs should be centered.
knobCentered = false;
// Type of the knobs
knobType = "classic"; // [classic, technic]

// Whether to draw pillars.
pillars = true;

// Whether brick should have Technic holes along X-axis.
holesX = false;
// Whether brick should have Technic holes along Y-axis.
holesY = false;
// Whether brick should have Technic holes along Z-axis.
holesZ = false;

// Whether brick should have a pit
pit = false;
// Whether knobs should be drawn inside pit
pitKnobs = false;
// Pit wall thickness as multiple of one brick side length
pitWallThickness = 0.333;

// Slanting size on X0 side specified as multiple of an 1x1 brick.
slantingX0 = 1;
// Slanting size on X1 side specified as multiple of an 1x1 brick.
slantingX1 = 0;
// Slanting size on Y0 side specified as multiple of an 1x1 brick.
slantingY0 = 0;
// Slanting size on Y1 side specified as multiple of an 1x1 brick.
slantingY1 = 0;

/* [Quality] */

// Quality of the preview in relation to the final rendering.
previewQuality = 0.5; // [0.1:0.1:1]
// Number of drawn fragments for roundings in the final rendering.
roundingResolution = 64; // [16:8:128]

/* [Calibration] */

// Adjustment of the height (mm)
baseHeightAdjustment = 0.0;
// Adjustment of each side (mm)
baseSideAdjustment = -0.1;
// Diameter of the knobs (mm)
knobSize = 5.0;
// Thickness of the walls (mm)
wallThickness = 1.5;
// Diameter of the Z-Tubes (mm)
tubeZSize = 6.4;

// Generate the block
block(
    grid = [brickSizeX, brickSizeY],
    baseLayers = baseLayers,
    baseCutoutType = baseCutoutType,
    
    knobs = knobs,
    knobCentered = knobCentered,
    knobType = knobType,
    
    pillars = pillars,
    
    holesX = holesX,
    holesY = holesY,
    holesZ = holesZ,
    
    pit = pit,
    pitKnobs = pitKnobs,
    pitWallThickness = pitWallThickness,
    
    slanting = ((slantingX0 != 0) || (slantingX1 != 0) || (slantingY0 != 0) || (slantingY1 != 0)) ? [slantingX0, slantingX1, slantingY0, slantingY1] : false, 

    previewQuality = previewQuality,
    baseRoundingResolution = roundingResolution,
    holeRoundingResolution = roundingResolution,
    knobRoundingResolution = roundingResolution,
    pillarRoundingResolution = roundingResolution,

    baseHeightAdjustment = baseHeightAdjustment,
    baseSideAdjustment = baseSideAdjustment,
    knobSize = knobSize,
    wallThickness = wallThickness,
    tubeZSize = tubeZSize
);
